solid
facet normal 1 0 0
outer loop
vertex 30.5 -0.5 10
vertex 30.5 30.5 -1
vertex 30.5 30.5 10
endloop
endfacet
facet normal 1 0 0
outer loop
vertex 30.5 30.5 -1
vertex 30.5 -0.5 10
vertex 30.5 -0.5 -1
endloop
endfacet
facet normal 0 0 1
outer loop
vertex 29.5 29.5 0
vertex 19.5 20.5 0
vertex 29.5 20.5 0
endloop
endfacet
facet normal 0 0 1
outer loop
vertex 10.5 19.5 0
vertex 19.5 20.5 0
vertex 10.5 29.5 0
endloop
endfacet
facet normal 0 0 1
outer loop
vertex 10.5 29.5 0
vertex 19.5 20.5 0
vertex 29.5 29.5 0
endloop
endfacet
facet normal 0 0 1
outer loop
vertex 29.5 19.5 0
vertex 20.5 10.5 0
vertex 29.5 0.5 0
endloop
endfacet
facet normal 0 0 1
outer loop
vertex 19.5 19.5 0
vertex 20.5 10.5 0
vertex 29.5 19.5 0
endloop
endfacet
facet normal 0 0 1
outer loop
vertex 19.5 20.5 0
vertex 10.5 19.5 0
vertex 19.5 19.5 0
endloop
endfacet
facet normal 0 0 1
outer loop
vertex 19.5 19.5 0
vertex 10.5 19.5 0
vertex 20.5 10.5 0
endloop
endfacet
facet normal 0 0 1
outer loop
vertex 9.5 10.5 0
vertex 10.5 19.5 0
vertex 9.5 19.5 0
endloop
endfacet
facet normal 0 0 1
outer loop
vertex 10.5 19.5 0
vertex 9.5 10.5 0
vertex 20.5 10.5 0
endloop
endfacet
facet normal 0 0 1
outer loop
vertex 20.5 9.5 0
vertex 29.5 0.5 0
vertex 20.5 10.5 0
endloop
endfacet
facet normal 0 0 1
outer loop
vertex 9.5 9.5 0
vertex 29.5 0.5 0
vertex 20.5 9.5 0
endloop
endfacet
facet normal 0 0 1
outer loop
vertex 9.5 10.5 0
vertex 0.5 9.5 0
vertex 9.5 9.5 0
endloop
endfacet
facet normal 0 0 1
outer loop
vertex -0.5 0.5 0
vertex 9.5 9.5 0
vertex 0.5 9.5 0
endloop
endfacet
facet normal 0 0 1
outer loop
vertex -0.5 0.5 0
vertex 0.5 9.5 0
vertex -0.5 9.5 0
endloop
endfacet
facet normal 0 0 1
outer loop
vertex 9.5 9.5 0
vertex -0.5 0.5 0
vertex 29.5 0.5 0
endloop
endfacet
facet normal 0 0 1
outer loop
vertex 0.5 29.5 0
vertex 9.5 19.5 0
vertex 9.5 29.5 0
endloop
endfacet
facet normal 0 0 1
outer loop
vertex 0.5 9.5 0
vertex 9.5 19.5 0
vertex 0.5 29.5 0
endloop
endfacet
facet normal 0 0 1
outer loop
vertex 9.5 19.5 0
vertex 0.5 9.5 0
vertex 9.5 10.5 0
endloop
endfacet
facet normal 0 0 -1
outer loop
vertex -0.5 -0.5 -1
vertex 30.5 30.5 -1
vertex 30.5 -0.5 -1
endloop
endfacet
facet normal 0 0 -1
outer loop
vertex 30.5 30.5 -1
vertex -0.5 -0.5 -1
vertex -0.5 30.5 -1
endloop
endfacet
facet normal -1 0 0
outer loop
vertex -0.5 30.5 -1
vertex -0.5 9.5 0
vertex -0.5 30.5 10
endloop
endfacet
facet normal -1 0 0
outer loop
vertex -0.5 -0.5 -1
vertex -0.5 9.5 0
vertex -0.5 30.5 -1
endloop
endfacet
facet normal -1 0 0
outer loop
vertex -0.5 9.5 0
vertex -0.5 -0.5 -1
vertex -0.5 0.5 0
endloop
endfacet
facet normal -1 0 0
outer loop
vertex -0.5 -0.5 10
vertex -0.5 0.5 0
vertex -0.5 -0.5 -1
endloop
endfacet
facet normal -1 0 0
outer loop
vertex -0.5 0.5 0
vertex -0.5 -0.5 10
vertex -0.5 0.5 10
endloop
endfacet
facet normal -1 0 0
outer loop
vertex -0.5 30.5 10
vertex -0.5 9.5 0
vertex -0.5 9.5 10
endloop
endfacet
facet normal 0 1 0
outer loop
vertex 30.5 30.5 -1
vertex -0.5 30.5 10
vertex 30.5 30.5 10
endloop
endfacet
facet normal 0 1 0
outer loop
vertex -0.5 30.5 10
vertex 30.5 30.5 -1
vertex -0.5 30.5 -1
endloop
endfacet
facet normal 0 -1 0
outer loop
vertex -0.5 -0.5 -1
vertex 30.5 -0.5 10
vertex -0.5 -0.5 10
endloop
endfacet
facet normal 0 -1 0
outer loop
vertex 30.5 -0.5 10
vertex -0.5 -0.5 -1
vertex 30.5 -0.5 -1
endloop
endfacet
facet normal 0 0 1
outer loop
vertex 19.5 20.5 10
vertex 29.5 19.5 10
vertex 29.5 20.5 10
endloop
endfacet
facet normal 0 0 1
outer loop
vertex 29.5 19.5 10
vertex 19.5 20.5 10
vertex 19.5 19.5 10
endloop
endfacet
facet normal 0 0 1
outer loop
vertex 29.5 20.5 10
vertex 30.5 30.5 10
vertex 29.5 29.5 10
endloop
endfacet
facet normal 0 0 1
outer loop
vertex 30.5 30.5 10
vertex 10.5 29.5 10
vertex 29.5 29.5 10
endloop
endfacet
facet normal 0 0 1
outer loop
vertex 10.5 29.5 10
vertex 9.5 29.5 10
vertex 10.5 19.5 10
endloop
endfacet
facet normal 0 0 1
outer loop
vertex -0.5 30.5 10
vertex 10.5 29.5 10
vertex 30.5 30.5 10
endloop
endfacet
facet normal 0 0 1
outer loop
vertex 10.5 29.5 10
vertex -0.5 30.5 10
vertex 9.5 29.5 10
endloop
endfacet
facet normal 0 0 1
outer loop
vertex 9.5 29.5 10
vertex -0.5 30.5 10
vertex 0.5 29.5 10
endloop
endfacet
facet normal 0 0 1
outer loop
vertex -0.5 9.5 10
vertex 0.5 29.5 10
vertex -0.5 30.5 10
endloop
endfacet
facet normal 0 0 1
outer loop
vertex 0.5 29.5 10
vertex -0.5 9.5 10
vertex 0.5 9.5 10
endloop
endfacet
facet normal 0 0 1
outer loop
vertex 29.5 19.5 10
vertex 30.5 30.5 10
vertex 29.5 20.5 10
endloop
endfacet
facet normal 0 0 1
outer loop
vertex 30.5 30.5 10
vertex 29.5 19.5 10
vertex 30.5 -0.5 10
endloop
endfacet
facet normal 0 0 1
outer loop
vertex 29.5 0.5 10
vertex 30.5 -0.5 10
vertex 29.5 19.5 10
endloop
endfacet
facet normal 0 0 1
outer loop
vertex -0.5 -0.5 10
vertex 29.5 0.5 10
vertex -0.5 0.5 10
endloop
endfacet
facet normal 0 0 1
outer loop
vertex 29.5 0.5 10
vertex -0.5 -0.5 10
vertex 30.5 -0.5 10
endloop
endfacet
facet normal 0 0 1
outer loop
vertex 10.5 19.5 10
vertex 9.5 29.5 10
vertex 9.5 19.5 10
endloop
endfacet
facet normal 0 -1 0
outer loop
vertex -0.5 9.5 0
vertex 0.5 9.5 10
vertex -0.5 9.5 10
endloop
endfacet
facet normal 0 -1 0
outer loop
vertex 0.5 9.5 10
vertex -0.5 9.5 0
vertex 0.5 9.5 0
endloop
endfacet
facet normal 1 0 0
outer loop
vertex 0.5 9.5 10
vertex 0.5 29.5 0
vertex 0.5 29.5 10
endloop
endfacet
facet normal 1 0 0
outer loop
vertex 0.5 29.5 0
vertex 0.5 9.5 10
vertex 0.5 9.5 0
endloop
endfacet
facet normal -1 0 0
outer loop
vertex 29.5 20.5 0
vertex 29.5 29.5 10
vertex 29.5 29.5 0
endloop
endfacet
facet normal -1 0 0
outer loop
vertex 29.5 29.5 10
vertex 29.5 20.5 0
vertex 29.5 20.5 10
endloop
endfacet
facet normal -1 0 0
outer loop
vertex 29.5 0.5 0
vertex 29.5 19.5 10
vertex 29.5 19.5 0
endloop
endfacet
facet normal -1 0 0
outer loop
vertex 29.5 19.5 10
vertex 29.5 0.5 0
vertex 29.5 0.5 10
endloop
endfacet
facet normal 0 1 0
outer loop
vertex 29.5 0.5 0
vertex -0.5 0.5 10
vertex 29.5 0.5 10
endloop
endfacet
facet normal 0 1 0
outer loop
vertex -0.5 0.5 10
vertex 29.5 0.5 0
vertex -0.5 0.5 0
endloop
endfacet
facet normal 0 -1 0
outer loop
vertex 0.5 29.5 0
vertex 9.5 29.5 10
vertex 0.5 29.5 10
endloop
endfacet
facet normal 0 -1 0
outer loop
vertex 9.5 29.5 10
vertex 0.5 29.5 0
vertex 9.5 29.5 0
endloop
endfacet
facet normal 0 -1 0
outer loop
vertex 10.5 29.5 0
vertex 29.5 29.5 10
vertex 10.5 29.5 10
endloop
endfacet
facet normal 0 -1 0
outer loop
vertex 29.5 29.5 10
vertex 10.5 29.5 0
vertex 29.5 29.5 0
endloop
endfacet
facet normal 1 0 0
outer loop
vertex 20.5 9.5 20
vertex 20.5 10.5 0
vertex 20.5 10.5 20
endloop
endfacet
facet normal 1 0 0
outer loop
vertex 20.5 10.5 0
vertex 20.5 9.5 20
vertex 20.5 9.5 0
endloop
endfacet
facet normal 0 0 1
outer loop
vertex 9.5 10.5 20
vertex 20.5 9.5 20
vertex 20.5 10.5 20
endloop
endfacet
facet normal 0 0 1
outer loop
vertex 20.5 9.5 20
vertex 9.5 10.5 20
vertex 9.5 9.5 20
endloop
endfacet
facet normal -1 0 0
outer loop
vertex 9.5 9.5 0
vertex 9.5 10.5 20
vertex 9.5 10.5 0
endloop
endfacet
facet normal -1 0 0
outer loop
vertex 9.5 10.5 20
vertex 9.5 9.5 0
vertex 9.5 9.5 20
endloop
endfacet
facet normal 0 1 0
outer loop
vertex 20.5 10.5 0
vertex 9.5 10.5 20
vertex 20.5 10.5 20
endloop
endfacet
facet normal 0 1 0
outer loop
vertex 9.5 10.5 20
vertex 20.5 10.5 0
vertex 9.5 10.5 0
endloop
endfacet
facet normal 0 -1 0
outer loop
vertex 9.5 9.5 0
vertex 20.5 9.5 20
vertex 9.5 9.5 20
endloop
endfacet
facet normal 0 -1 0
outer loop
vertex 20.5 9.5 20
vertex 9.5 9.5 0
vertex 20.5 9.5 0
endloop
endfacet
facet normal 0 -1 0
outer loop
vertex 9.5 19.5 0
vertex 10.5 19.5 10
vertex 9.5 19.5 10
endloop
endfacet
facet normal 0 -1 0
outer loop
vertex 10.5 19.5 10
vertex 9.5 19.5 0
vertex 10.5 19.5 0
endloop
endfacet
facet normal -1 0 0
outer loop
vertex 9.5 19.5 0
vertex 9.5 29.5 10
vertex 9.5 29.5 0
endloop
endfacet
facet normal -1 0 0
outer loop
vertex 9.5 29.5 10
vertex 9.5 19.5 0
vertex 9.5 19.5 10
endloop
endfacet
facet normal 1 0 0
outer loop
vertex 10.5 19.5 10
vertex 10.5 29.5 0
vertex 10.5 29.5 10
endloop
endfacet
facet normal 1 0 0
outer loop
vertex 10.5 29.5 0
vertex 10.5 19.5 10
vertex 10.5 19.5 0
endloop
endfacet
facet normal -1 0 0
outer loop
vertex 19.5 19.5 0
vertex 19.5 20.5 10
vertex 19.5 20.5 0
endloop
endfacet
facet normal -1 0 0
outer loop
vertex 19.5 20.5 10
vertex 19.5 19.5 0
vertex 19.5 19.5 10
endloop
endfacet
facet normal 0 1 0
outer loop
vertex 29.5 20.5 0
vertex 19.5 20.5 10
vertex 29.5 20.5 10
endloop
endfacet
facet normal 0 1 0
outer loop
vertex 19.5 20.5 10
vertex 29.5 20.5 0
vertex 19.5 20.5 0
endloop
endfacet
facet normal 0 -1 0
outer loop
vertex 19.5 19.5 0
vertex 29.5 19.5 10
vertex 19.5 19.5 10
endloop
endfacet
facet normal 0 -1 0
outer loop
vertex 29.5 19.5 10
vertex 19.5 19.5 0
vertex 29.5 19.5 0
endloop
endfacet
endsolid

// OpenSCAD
translate([-0.5,-0.5,-1]) cube([31,31, 1]); 
translate([0, 20.000000, 5.000000]){rotate([0,0,90]){cube([21.000000,1,10.000000], center = true);}} 
translate([30.000000, 15.000000, 5.000000]){rotate([0,0,90]){cube([31.000000,1,10.000000], center = true);}} 
translate([15.000000, 0, 5.000000]){cube([31.000000,1,10.000000], center = true);} 
translate([15.000000, 30.000000, 5.000000]){cube([31.000000,1,10.000000], center = true);} 
translate([15.000000, 10.000000, 15.000000]){rotate([0,0,0.000000]){cube([11.000000,1,10.000000], center = true);} } 
translate([10.000000, 25.000000, 5.000000]){rotate([0,0,90.000000]){cube([11.000000,1,10.000000], center = true);} } 
translate([10.000000, 25.000000, 5.000000]){rotate([0,0,90.000000]){cube([11.000000,1,10.000000], center = true);} } 
translate([15.000000, 10.000000, 5.000000]){rotate([0,0,0.000000]){cube([11.000000,1,10.000000], center = true);} } 
translate([25.000000, 20.000000, 5.000000]){rotate([0,0,0.000000]){cube([11.000000,1,10.000000], center = true);} } 
translate([30.000000, 15.000000, 5.000000]){rotate([0,0,90.000000]){cube([11.000000,1,10.000000], center = true);} } 
translate([30.000000, 15.000000, 5.000000]){rotate([0,0,90.000000]){cube([11.000000,1,10.000000], center = true);} } 
translate([25.000000, 20.000000, 5.000000]){rotate([0,0,0.000000]){cube([11.000000,1,10.000000], center = true);} } 
